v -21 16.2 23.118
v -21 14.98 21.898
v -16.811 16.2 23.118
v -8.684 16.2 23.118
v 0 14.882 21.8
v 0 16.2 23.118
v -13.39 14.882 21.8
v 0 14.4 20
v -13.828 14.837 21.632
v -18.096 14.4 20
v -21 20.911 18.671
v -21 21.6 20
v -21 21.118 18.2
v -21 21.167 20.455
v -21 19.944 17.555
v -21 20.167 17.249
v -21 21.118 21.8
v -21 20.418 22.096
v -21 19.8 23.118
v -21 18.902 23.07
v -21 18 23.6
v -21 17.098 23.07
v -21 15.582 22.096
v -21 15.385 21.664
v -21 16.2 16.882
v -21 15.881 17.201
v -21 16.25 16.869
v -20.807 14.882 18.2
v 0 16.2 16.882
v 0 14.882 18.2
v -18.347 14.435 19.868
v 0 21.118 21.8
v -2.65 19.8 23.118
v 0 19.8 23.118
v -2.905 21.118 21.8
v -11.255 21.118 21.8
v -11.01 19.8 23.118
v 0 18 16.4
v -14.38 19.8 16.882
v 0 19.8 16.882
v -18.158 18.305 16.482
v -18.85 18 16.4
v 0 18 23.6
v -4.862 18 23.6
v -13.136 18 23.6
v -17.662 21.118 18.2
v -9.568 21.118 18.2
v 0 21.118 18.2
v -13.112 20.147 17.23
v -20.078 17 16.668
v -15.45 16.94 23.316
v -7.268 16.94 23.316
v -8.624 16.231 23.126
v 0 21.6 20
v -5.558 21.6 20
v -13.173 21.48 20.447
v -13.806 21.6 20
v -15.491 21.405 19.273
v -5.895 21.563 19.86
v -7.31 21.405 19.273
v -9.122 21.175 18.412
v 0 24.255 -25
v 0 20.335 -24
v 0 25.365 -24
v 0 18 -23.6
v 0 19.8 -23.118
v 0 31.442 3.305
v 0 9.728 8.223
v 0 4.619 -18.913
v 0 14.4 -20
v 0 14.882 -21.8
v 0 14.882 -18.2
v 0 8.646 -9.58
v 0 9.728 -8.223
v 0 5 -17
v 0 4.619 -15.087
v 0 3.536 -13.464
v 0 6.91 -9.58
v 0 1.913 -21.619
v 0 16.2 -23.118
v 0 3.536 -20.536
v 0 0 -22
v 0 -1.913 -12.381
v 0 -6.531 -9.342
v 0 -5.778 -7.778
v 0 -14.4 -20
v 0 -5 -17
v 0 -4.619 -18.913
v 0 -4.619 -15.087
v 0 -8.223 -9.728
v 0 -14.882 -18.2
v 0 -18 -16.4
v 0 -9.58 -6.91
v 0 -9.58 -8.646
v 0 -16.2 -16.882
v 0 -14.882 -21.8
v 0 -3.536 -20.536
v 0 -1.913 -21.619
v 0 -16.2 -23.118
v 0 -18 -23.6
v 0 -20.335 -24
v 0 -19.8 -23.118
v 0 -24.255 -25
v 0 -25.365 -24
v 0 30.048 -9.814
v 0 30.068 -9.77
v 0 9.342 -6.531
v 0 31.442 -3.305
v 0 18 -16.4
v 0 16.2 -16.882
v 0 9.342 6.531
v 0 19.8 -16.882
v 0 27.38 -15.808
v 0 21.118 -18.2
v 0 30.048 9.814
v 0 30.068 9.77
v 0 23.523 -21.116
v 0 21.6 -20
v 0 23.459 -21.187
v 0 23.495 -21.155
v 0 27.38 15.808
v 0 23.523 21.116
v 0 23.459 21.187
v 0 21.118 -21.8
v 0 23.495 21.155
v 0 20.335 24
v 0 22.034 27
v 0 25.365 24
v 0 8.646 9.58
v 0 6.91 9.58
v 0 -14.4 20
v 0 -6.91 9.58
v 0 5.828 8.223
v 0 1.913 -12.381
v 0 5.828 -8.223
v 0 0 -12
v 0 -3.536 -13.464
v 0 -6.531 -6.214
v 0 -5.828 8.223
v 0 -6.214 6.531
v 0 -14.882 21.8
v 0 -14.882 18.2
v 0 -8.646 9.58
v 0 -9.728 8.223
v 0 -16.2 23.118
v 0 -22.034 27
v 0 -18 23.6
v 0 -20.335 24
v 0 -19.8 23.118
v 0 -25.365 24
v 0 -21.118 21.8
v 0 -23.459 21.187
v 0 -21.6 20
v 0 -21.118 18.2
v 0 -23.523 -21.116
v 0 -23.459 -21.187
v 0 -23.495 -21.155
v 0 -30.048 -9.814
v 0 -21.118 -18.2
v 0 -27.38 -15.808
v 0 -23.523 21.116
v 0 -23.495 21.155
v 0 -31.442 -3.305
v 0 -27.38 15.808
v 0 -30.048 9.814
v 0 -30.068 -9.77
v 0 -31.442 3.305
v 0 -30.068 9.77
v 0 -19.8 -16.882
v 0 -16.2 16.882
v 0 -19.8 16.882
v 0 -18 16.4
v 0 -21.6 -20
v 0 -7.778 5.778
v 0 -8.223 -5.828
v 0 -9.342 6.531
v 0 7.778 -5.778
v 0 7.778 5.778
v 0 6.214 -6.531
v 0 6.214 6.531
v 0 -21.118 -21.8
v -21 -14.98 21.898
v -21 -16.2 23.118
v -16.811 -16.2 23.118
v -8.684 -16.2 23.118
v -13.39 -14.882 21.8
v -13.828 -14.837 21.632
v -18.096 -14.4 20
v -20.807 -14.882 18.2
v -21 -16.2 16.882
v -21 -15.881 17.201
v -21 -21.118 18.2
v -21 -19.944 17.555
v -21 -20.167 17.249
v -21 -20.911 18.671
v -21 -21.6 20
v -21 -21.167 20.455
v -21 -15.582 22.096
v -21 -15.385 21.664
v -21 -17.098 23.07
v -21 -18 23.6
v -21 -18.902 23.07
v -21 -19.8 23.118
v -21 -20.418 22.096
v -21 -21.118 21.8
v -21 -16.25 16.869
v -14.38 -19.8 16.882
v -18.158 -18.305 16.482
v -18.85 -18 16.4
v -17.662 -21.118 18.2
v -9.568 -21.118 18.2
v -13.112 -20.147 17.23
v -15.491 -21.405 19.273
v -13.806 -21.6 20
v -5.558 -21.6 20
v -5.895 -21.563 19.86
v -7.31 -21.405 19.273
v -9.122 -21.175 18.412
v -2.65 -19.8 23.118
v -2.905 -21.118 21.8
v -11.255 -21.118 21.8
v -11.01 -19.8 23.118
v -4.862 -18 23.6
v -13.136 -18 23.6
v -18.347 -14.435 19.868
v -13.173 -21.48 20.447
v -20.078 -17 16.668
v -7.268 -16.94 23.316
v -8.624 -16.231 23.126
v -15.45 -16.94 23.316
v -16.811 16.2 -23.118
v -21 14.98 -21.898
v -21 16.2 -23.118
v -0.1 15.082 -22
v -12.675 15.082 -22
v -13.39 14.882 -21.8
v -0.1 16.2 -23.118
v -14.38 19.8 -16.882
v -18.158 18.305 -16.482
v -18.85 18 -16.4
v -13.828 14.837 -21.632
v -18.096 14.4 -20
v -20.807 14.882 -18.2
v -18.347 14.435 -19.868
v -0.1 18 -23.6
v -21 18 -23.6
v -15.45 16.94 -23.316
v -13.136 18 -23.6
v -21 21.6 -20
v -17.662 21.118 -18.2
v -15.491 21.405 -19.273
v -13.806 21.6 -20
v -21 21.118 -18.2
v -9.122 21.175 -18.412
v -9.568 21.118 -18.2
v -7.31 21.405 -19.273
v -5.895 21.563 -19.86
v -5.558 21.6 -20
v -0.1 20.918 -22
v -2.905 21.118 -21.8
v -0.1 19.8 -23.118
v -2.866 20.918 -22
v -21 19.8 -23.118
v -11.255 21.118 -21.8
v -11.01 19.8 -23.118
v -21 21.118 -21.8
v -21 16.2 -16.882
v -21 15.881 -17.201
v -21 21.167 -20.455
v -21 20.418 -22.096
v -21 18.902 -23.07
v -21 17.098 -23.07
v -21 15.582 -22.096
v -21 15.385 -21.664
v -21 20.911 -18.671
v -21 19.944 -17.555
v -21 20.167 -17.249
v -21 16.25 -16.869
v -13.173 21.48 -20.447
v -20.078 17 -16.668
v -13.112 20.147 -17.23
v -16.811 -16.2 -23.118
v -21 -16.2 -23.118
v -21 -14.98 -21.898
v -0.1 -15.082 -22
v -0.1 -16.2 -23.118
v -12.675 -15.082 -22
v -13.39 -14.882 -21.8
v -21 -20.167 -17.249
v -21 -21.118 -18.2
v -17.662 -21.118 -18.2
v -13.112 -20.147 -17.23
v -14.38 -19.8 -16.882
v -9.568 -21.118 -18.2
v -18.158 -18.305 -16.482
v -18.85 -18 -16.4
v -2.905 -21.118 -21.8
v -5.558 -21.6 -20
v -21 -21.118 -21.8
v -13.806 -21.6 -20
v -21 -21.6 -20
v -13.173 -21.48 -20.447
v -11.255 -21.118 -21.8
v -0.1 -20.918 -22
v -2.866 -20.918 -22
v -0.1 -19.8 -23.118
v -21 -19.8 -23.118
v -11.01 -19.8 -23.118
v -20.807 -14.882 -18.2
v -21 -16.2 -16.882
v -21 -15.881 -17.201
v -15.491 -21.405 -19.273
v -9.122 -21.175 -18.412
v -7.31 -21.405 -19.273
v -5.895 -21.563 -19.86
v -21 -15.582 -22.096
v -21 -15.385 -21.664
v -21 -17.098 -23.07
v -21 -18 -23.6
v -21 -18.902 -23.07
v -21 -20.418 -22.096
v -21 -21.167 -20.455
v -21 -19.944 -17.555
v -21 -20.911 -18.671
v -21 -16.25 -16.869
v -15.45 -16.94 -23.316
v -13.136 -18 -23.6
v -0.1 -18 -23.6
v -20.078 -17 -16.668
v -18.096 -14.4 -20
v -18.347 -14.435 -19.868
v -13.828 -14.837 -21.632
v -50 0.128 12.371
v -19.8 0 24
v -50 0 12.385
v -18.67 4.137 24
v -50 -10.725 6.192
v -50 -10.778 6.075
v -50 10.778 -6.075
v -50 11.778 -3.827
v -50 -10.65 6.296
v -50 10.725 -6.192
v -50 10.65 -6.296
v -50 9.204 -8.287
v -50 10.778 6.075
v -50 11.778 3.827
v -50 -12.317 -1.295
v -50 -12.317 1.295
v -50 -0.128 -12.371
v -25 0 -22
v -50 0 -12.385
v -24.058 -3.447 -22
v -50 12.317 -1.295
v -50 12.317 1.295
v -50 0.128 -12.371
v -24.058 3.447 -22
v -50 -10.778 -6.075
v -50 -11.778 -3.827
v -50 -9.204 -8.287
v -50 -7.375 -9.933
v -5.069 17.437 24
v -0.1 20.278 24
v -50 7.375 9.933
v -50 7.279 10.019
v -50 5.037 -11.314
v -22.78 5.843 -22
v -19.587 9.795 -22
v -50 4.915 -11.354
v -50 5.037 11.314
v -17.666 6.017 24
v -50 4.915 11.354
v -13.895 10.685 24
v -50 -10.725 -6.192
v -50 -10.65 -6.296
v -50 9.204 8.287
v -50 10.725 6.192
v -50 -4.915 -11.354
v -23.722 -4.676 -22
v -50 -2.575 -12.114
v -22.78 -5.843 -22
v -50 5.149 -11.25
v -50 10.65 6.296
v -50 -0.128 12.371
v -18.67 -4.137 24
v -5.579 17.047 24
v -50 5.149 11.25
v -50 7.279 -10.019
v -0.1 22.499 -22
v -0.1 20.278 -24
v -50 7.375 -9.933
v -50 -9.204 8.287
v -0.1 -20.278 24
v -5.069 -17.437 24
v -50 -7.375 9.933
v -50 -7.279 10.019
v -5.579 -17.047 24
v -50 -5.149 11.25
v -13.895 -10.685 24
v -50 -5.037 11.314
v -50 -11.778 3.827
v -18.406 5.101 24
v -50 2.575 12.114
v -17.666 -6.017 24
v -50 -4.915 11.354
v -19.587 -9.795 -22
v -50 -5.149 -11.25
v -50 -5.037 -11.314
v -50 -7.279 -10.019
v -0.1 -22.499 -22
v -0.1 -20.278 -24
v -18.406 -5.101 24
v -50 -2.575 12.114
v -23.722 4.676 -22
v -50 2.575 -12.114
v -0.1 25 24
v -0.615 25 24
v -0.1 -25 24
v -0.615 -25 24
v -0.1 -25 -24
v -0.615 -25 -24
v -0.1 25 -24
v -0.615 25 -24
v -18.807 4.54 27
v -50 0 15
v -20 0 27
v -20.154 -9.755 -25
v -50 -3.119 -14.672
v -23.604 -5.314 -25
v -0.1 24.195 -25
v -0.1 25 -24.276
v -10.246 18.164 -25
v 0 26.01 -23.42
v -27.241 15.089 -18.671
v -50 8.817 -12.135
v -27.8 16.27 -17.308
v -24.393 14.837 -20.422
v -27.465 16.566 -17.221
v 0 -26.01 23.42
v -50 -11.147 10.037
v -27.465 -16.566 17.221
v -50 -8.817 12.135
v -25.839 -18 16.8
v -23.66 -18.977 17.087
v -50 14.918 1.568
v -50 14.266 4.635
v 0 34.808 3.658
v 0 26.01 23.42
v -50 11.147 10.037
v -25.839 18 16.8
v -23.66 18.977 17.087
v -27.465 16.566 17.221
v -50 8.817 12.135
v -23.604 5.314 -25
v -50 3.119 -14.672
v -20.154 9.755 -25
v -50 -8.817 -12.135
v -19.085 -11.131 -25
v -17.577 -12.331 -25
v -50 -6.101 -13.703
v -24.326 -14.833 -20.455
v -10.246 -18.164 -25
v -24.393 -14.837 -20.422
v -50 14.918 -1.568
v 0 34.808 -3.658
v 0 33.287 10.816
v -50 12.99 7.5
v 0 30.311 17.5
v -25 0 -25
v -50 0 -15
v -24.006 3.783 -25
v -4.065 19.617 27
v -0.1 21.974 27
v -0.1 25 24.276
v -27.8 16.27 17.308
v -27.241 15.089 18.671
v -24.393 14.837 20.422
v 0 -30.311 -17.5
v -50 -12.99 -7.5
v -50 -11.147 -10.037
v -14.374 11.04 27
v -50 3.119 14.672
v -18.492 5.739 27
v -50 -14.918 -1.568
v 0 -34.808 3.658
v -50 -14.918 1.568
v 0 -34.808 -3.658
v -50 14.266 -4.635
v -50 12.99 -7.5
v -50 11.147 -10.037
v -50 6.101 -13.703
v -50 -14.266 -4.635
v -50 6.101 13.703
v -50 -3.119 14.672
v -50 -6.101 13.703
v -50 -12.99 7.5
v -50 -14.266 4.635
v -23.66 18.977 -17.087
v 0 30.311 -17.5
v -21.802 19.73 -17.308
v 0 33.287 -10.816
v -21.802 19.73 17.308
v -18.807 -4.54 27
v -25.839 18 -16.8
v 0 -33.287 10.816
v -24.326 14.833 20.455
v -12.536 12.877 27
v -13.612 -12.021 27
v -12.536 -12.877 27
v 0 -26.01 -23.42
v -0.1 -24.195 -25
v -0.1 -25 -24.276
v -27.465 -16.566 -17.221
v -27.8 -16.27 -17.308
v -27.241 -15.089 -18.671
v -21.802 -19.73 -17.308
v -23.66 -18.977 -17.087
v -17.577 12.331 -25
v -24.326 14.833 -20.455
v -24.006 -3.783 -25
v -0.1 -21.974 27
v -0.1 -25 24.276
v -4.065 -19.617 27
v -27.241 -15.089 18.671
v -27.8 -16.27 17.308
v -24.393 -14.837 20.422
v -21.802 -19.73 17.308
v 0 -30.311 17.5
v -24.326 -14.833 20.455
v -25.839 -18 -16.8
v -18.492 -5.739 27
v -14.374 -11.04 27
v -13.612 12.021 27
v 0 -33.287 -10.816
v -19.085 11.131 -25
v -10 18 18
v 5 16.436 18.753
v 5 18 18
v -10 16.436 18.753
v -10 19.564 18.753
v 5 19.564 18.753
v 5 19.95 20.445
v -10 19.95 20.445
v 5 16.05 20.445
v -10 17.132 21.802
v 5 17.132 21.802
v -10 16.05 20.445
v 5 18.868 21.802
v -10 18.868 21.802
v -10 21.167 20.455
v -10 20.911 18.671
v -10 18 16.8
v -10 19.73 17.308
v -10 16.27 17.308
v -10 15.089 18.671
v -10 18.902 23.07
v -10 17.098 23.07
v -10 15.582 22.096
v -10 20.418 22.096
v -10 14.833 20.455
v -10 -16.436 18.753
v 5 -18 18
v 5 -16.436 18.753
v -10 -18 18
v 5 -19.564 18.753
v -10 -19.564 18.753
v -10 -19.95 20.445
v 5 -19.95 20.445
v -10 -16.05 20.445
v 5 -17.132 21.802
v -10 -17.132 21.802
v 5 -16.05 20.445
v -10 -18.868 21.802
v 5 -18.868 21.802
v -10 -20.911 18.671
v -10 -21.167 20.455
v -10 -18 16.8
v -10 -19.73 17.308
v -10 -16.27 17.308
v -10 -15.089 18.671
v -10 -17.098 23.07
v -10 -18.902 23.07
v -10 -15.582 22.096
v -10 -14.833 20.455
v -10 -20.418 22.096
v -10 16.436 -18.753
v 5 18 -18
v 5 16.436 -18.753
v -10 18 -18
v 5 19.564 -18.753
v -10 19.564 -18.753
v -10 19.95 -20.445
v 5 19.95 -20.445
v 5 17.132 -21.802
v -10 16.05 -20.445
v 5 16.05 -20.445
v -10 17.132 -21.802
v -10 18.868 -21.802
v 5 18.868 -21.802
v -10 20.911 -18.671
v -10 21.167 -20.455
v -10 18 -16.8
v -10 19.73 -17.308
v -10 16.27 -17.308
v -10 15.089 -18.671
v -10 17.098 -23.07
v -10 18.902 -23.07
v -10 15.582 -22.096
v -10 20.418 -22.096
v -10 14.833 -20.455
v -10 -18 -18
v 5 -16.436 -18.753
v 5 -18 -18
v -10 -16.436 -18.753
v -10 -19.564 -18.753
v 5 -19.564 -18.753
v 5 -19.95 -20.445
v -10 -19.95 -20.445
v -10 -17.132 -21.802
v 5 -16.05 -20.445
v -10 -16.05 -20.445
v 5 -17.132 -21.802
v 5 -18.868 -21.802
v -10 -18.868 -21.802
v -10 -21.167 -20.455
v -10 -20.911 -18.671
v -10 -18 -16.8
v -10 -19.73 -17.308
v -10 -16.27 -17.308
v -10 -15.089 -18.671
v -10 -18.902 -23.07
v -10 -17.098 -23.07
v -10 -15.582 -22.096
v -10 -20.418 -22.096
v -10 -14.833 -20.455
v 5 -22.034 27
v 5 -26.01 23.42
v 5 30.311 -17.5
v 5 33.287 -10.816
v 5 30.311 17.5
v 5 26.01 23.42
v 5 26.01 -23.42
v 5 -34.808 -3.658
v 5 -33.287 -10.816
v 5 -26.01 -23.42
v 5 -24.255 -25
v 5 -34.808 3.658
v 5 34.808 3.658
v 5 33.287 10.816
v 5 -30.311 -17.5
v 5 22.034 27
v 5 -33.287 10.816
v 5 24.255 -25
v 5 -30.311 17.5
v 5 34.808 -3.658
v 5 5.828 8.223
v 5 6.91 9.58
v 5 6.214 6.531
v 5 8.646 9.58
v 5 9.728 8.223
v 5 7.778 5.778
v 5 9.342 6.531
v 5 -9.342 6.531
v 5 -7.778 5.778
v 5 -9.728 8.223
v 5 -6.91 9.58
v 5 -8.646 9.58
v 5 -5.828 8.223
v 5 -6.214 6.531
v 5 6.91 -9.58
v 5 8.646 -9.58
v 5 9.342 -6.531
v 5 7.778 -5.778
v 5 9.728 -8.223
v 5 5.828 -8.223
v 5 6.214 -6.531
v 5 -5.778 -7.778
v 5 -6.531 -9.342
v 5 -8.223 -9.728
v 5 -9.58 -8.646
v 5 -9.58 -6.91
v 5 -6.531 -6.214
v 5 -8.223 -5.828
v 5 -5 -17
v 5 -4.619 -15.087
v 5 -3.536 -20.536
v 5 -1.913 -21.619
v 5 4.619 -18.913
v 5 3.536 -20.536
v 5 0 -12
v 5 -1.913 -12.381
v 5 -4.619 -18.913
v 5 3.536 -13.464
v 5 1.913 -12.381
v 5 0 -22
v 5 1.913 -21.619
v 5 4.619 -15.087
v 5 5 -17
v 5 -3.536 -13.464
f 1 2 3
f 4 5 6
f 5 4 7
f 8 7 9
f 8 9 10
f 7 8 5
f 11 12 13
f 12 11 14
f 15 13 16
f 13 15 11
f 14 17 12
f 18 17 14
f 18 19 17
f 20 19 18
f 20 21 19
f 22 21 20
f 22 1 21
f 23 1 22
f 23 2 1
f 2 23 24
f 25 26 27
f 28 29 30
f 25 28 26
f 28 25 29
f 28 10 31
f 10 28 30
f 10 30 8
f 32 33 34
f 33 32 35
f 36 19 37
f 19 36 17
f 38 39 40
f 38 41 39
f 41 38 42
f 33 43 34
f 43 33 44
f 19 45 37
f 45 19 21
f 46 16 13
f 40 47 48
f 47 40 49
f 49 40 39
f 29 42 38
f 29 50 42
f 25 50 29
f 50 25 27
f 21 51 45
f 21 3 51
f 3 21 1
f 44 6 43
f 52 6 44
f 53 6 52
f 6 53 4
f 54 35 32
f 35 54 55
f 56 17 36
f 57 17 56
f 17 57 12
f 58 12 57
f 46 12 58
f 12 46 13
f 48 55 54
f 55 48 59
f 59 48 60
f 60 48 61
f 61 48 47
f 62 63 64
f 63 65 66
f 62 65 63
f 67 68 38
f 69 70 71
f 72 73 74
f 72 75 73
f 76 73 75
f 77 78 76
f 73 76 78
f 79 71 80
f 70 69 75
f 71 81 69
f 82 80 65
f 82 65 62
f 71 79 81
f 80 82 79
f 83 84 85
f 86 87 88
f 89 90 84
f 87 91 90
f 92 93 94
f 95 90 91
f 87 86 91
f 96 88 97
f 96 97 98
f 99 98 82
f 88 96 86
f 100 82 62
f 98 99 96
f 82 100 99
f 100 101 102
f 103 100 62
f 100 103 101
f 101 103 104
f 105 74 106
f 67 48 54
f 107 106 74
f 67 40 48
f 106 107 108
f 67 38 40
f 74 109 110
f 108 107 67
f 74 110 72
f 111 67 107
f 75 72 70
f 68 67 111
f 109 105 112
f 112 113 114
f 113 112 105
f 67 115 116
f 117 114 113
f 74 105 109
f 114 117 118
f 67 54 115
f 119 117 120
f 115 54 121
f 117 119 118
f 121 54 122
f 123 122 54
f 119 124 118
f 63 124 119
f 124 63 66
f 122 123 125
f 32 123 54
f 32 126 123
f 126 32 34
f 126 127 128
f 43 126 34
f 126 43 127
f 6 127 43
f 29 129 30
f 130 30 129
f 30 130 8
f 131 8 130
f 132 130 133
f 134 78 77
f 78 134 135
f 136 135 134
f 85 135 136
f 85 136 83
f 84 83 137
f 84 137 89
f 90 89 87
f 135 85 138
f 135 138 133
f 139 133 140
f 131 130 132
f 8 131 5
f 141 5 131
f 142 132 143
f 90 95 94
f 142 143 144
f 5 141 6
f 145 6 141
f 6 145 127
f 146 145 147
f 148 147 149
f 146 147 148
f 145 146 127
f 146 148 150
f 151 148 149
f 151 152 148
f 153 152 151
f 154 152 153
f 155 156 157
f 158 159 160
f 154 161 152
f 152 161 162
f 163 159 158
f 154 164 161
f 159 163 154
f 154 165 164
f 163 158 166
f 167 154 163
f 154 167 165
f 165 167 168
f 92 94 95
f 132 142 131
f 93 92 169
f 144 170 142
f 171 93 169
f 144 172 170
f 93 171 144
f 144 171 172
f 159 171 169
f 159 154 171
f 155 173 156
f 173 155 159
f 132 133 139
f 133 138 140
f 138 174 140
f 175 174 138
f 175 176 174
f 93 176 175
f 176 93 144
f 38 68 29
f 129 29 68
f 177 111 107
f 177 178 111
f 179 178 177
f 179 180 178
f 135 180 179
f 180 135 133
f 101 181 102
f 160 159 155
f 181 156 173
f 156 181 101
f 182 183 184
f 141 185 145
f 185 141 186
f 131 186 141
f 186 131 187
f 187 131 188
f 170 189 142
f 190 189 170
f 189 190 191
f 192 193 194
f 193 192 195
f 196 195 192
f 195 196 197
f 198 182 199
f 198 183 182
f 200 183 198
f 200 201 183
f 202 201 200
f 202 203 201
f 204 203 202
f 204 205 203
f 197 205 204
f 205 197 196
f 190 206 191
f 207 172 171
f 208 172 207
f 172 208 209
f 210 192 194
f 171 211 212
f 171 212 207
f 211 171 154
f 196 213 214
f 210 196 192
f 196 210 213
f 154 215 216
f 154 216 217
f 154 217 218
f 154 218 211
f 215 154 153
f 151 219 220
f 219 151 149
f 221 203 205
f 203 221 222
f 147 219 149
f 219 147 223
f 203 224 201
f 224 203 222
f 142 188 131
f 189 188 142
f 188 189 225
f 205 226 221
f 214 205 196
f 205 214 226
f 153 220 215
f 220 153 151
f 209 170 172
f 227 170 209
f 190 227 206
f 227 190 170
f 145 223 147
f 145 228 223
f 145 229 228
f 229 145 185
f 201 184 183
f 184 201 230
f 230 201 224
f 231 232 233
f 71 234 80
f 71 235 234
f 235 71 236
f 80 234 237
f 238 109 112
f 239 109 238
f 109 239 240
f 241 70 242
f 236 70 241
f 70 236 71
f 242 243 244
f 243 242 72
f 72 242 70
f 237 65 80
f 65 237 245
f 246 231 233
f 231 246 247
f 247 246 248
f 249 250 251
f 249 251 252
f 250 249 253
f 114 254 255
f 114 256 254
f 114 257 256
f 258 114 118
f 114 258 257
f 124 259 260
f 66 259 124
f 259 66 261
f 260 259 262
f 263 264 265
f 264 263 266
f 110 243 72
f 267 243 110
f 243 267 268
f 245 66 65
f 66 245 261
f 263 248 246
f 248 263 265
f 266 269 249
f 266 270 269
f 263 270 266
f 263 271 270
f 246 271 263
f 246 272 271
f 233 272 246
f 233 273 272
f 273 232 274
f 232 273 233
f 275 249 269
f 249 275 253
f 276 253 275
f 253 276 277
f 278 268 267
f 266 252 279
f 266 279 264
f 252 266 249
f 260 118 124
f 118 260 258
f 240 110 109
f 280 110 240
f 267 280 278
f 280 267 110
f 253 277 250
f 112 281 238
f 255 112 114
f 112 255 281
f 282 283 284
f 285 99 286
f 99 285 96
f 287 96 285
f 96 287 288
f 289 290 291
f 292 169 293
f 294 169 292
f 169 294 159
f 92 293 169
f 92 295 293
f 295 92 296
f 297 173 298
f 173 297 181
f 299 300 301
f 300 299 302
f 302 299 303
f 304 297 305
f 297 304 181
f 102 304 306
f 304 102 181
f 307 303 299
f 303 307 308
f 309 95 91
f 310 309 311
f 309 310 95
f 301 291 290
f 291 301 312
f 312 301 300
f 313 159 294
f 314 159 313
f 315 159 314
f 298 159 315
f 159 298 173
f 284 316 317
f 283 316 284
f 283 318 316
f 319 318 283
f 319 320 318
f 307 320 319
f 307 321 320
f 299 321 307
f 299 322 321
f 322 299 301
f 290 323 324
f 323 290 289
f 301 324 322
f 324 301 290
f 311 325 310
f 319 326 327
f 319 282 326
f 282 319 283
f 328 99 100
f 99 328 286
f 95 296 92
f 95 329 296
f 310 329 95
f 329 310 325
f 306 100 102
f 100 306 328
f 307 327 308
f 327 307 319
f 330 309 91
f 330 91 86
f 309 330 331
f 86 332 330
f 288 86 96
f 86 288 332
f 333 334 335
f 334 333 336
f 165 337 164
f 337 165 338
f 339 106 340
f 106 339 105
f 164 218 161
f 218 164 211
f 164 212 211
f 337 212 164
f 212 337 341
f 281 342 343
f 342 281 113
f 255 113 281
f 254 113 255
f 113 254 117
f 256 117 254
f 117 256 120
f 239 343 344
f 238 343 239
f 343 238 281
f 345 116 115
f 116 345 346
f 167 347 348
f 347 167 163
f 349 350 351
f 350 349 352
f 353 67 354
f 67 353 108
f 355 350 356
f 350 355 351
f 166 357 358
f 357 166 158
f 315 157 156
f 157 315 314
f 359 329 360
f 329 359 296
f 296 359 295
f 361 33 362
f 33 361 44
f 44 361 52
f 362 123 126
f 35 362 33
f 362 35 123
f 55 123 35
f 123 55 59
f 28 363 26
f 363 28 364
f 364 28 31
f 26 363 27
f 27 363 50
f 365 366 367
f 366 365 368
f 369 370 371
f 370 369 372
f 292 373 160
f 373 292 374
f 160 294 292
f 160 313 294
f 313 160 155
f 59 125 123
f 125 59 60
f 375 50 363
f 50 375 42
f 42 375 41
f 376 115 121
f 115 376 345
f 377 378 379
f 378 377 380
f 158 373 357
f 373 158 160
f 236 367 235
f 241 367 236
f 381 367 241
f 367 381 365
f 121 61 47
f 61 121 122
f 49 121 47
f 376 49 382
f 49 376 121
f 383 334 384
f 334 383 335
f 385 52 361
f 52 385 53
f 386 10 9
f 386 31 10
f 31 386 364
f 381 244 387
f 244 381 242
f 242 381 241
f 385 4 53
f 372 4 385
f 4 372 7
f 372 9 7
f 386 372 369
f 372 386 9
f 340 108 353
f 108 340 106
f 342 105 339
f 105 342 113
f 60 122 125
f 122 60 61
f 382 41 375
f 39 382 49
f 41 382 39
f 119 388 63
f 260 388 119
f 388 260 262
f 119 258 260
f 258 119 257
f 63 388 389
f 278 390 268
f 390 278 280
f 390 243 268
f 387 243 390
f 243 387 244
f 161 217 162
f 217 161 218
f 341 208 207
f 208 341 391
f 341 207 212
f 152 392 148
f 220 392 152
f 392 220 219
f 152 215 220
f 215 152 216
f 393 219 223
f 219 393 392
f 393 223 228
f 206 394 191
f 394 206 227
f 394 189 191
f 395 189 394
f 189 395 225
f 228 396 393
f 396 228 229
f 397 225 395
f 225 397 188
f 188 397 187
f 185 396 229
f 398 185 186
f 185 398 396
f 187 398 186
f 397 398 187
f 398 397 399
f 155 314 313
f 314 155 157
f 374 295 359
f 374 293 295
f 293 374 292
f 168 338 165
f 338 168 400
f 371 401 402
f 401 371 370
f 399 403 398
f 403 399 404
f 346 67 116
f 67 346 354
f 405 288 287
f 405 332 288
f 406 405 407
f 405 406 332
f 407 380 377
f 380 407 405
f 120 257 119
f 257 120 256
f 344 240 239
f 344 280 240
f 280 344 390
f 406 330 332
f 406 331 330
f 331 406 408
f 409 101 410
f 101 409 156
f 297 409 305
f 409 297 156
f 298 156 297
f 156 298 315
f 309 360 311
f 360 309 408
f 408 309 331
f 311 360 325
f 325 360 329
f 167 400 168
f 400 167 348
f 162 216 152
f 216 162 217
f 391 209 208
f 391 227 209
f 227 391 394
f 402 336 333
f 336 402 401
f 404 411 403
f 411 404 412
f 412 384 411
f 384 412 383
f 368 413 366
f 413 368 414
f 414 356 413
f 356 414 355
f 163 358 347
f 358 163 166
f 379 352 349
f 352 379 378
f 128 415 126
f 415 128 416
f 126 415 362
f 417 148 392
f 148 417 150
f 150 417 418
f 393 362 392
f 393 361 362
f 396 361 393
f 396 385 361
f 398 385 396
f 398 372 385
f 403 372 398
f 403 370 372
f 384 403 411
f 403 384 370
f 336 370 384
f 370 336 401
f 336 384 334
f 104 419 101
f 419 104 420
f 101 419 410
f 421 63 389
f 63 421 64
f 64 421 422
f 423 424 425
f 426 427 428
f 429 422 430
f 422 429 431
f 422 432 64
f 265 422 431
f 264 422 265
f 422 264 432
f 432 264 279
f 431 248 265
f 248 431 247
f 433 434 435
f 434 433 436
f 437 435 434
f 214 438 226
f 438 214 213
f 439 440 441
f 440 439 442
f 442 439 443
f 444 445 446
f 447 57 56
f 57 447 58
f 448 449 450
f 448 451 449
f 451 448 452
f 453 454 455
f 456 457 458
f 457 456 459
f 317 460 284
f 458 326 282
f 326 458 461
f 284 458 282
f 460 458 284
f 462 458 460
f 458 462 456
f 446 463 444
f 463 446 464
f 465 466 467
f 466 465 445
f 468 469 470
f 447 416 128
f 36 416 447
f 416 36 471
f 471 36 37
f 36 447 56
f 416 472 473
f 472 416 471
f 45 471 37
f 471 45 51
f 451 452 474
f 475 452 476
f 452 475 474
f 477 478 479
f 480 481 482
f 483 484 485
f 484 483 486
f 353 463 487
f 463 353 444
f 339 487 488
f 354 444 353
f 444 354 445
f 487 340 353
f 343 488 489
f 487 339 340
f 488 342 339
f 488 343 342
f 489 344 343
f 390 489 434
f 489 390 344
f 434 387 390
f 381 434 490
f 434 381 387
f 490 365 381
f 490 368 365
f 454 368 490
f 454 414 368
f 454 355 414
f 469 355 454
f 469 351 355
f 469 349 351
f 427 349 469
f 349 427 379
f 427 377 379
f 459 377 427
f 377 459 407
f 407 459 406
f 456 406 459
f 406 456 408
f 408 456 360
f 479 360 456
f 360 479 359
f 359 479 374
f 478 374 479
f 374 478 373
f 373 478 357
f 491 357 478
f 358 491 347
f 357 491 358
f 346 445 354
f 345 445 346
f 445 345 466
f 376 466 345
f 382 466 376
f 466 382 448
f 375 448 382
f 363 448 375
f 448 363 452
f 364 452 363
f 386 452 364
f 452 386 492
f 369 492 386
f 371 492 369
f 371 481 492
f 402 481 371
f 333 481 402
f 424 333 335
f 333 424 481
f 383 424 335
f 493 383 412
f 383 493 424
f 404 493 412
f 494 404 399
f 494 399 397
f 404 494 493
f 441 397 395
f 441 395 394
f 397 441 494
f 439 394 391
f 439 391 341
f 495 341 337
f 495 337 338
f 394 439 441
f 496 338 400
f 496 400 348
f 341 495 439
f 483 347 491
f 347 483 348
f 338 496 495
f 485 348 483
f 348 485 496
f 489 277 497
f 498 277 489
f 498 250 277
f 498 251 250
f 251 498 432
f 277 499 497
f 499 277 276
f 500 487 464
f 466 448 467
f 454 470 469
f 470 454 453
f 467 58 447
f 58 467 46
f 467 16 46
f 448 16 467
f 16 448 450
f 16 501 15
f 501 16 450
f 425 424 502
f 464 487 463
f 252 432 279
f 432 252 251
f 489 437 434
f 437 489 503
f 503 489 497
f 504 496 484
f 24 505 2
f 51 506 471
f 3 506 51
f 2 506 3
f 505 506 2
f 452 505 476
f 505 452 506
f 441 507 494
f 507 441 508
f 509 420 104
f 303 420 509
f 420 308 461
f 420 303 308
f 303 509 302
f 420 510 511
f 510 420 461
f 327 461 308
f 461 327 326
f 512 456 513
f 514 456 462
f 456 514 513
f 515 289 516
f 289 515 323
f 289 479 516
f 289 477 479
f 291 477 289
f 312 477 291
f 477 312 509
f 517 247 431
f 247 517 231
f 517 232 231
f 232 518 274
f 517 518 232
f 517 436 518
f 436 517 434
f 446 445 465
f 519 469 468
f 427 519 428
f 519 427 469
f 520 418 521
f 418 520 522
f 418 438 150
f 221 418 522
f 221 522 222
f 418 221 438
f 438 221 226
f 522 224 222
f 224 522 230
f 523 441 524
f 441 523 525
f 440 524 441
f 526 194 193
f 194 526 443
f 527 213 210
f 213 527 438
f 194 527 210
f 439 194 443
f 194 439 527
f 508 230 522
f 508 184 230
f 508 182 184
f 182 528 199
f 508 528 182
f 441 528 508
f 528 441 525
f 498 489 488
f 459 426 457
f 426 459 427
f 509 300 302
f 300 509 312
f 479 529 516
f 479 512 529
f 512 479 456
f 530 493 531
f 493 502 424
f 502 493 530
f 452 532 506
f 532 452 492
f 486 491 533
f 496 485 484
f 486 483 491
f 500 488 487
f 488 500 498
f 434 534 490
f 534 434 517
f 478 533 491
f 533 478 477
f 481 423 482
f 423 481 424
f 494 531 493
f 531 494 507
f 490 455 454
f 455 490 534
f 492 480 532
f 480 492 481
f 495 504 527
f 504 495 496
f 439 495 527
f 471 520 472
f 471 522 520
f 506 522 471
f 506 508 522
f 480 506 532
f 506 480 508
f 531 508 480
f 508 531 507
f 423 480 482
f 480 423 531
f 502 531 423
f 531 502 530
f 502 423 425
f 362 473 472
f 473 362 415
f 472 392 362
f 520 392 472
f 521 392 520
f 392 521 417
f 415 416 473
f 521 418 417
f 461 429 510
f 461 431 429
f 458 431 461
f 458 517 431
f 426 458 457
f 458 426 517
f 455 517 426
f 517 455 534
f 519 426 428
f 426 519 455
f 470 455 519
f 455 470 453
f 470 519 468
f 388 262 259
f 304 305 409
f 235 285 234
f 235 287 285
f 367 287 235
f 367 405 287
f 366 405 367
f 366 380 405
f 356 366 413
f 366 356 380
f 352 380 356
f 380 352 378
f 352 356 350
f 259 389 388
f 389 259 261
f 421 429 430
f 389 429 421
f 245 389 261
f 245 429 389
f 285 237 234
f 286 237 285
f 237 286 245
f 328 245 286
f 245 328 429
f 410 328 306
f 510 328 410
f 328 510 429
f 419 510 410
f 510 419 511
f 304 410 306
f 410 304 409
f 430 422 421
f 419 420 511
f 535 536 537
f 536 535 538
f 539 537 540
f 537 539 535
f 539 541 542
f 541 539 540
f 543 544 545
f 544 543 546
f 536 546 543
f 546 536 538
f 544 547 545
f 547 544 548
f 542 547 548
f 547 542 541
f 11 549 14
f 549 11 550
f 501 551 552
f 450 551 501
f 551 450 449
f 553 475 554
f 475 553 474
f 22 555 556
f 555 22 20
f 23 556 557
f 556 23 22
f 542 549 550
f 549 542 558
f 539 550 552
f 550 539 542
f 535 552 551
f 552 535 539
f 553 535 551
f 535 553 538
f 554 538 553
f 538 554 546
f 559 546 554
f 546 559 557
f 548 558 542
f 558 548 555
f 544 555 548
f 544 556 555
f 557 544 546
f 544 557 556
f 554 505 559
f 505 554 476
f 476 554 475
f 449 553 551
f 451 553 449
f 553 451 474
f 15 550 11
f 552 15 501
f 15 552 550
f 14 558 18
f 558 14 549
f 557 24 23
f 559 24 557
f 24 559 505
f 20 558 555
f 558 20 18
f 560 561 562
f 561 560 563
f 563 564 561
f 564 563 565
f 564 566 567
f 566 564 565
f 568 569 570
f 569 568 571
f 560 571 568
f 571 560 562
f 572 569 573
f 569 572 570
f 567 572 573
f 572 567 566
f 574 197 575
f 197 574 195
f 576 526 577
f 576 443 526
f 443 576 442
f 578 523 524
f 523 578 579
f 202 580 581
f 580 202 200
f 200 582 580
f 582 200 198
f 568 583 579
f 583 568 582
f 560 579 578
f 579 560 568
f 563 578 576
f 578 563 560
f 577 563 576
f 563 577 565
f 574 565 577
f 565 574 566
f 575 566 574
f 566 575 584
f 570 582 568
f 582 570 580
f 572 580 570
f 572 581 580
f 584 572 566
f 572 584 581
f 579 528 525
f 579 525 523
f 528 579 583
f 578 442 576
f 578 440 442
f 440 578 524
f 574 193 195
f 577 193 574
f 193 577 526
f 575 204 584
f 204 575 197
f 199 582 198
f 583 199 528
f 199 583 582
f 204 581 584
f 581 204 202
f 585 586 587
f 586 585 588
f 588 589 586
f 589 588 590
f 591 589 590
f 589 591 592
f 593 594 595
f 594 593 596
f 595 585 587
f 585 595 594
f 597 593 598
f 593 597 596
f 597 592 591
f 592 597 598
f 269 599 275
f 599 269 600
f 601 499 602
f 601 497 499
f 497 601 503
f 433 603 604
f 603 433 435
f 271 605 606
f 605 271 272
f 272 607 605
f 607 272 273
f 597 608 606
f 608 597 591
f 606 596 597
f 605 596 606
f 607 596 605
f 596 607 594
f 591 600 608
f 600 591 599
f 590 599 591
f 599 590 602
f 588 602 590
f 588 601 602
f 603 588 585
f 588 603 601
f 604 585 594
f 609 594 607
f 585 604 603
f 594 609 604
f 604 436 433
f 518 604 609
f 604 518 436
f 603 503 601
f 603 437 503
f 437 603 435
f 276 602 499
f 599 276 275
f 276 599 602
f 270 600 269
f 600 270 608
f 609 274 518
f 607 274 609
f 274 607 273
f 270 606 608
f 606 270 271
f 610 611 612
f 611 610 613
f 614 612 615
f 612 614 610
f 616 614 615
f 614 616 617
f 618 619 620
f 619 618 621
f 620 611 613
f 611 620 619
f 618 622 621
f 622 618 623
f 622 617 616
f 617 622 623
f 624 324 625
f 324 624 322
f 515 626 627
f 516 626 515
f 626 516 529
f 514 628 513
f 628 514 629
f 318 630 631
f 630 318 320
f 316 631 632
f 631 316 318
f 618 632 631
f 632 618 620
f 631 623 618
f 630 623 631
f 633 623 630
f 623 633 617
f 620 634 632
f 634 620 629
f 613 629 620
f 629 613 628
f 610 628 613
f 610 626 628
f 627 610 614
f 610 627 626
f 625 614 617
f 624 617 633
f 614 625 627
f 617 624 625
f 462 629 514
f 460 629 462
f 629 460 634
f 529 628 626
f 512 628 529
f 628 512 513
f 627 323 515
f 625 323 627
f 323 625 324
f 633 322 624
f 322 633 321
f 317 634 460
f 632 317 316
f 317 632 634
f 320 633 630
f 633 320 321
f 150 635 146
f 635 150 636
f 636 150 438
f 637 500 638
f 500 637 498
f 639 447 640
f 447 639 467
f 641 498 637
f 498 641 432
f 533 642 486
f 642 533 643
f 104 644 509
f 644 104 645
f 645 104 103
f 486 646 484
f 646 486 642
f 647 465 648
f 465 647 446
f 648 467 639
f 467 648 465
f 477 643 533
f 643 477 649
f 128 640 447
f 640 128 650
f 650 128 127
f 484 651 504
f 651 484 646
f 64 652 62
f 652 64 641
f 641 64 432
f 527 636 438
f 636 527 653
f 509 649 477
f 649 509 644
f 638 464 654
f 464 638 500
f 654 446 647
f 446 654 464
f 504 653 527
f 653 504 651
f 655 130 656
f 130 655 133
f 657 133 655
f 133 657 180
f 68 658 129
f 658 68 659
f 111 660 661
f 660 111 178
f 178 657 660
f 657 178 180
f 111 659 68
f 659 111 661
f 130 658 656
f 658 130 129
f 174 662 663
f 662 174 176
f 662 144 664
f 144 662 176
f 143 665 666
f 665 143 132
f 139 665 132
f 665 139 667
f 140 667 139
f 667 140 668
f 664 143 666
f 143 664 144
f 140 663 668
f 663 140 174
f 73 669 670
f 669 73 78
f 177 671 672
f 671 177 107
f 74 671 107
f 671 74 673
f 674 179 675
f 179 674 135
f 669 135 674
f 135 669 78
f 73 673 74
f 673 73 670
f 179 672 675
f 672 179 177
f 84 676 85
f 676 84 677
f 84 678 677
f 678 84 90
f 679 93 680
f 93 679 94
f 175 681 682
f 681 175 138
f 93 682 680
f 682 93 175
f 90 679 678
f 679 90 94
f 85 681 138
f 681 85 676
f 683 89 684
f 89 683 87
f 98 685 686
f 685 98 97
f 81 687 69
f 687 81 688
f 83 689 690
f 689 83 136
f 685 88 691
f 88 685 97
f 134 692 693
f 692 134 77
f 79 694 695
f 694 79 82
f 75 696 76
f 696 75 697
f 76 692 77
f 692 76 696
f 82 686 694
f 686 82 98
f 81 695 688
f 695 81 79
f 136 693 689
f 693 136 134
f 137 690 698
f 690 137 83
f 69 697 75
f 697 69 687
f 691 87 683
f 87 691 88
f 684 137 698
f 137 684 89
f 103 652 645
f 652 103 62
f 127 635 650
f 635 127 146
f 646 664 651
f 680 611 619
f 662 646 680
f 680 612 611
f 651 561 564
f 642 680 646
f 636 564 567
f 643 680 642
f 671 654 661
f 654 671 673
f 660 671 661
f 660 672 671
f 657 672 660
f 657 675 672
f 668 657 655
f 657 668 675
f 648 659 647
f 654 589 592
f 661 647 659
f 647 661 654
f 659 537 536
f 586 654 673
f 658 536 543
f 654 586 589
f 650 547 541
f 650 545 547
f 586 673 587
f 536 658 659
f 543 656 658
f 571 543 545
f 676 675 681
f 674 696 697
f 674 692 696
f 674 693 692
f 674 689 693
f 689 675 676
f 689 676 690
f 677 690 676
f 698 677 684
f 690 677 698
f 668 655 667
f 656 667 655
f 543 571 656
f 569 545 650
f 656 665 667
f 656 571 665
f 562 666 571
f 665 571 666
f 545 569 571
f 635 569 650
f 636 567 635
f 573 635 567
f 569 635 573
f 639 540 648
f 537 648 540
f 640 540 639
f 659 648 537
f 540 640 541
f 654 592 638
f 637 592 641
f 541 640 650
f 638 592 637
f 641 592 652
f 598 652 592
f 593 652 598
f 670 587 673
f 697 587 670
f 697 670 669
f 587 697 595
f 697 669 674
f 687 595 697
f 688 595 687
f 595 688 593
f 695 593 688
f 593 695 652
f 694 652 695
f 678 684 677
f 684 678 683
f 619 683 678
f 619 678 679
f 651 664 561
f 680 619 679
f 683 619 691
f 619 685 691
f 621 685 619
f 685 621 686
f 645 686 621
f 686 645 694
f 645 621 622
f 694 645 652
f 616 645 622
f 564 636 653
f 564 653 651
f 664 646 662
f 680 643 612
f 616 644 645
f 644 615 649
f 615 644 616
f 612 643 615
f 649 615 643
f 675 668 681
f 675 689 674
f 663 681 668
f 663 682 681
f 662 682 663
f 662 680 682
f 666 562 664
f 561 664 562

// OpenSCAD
module nose_one_hole(){
  translate([-25,18,20])
  rotate([0,90,0])
  cylinder(r=2,h=600);
  nose_one_countersunk();
}

module nose_one_countersunk(){
  translate([-30,18,20])
  rotate([0,90,0])
  cylinder(r=3.2,h=20);
}

module nose_one_screw_cylinder(){
  translate([-21,18,20]) rotate([0,90,0]) cylinder(r=3.6,h=21);
}

module nose_screw_cylinders(){
  mirror([0,0,0]) nose_one_screw_cylinder();
  mirror([0,1,0]) nose_one_screw_cylinder();
  mirror([0,0,1]) nose_one_screw_cylinder();
  mirror([0,1,0])mirror([0,0,1]) nose_one_screw_cylinder();
}

module nose_holes(){
  mirror([0,0,0]) nose_one_hole();
  mirror([0,1,0]) nose_one_hole();
  mirror([0,0,1]) nose_one_hole();
  mirror([0,1,0])mirror([0,0,1]) nose_one_hole();
}

module nose(){

difference(){
  nose_no_holes();
  nose_holes();
}

}

module nose_no_holes(){
      nose_screw_cylinders();
translate([155,0,0])
rotate([0,180,0])
  difference(){
    union(){
      difference(){
          translate([155,0,0])
          rotate([0,90,0])
          cylinder(r1=35,r2=15,h=50);

        union(){

          // Inner
          translate([154,0,0])
          rotate([0,90,0])
          cylinder(r1=32,r2=12,h=52);

          // Upper plane
          translate([1,-100,-63+1])
          cube([2000,2000,38]);

          // Down plane
          translate([1,-100,27-3])
          cube([2000,2000,40]);
        }
      }
      // Upper plane
      translate([155+0.1,-25,-27])
      cube([30,50,3]);

      // Down plane
      translate([155+0.1,-25,26-4])
      cube([30,50,3]);

    }

    // Clear perimeter of nose
    difference(){
      translate([155,0,0])
      rotate([0,90,0])
      cylinder(r1=370,r2=170,h=60);

      translate([155,0,0])
      rotate([0,90,0])
      cylinder(r1=35,r2=15,h=50);

    }
  }
}
module 
motor_hole(){
  translate([-70,15.556/2,15.556/2])
  rotate([0,90,0])
  cylinder(r1=2,r2=2,h=100);
}
module motor_holes(){
  mirror([0,0,0])motor_hole();
  mirror([0,1,0])motor_hole();
  mirror([0,0,1])motor_hole();
  mirror([0,1,1])motor_hole();
    translate([-70,0,-17])
    rotate([0,90,0])
    cylinder(r=5,h=100);
}

module motor_plate(){
    difference(){

  translate([0,-35,-30])cube([5,70,70]);
  union(){
  difference(){
    translate([-1,0,0]) rotate([0,90,0]) cylinder(r=100,h=50);
    translate([0,0,0]) rotate([0,90,0]) cylinder(r=35,h=50);
  }
      // Upper plane
      translate([-1,-25,-35])
      cube([30,50,10]);

      // Down plane
      translate([-1,-25,27])
      cube([30,50,30]);



nose_holes();
motor_holes();

  }

    }



}

nose();

motor_plate();
